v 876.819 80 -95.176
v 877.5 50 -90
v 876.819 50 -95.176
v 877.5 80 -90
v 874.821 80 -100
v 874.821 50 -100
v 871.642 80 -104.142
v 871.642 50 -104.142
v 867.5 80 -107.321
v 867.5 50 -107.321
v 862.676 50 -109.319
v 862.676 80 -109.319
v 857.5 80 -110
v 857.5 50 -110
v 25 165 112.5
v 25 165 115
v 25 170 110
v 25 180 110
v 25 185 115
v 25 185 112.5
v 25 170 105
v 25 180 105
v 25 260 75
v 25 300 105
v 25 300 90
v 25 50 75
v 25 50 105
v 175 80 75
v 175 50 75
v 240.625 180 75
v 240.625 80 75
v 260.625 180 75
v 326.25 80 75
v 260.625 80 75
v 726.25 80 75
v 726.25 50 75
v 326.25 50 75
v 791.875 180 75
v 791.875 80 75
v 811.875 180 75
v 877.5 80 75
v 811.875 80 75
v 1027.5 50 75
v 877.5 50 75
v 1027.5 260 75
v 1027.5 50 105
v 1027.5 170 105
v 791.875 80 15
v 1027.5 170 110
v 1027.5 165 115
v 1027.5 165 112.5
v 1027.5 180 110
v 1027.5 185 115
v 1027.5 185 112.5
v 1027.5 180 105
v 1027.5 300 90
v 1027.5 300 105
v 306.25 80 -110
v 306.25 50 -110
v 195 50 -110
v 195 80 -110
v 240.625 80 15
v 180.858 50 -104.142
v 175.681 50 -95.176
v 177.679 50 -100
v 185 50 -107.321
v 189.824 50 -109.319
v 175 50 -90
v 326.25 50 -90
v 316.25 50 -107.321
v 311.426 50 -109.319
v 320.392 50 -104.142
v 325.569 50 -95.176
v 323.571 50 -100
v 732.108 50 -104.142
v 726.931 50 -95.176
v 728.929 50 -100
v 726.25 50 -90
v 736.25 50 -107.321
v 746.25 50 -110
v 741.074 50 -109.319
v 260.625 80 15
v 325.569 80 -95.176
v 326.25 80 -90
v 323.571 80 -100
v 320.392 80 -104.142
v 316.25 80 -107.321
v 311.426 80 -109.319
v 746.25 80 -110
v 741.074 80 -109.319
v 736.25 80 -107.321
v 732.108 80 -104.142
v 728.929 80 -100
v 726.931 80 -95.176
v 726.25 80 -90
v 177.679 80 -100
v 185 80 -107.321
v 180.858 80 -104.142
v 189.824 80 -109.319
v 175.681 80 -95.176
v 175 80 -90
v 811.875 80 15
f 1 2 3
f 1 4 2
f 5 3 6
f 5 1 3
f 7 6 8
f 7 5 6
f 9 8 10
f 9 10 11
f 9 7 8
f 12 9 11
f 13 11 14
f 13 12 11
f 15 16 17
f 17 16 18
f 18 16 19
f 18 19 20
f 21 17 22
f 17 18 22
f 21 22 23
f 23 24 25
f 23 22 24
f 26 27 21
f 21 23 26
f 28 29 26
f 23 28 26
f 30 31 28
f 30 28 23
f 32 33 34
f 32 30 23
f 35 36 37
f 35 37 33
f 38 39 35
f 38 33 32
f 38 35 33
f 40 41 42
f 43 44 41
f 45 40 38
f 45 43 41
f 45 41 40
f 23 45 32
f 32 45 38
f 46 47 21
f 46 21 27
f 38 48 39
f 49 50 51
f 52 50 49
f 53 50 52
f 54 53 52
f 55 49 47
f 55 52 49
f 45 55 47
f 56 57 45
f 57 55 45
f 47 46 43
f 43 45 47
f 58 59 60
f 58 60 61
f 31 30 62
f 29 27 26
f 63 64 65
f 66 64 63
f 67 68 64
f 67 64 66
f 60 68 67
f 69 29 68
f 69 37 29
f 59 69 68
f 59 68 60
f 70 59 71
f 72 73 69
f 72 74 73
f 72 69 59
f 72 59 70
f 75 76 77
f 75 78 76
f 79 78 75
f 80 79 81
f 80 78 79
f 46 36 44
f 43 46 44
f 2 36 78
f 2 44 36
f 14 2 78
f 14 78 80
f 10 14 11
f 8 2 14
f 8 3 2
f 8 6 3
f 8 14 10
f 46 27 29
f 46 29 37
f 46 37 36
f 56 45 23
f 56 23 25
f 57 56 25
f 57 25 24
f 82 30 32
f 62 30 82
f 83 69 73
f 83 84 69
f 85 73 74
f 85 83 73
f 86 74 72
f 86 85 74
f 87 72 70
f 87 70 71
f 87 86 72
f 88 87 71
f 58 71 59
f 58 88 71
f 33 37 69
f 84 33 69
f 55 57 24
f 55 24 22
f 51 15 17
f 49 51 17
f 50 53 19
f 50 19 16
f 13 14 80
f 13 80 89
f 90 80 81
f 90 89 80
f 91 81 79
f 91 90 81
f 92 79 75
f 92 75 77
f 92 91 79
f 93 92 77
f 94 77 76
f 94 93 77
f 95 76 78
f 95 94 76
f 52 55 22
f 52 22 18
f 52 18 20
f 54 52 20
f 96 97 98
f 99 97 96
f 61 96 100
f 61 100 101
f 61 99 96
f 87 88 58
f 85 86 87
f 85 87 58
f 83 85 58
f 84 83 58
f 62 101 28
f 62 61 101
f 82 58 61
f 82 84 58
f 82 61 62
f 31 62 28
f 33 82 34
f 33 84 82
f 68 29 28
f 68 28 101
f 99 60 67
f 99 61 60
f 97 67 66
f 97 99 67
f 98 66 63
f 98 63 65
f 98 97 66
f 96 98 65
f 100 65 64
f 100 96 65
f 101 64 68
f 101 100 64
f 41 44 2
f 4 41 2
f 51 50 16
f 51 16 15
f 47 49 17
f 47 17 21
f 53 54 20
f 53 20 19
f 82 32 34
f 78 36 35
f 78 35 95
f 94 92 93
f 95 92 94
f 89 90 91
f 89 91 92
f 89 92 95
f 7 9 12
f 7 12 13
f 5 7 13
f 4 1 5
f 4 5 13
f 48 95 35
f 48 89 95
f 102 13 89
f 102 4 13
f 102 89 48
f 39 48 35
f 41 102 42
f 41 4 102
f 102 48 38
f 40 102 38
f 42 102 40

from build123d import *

# Parameters (mm, degrees)
EXTRUDE_1_DEPTH          = 1002.5
CUT_EXTRUDE_1_DEPTH      = 1058.062557278
CUT_EXTRUDE_1_DEPTH_BACK = 1058.062557278
SKETCH_2_W               = 400
SKETCH_2_H               = 185
CUT_EXTRUDE_2_DEPTH      = 1058.062557278
CUT_EXTRUDE_2_DEPTH_BACK = 1058.062557278
SKETCH_3_W               = 150
SKETCH_3_H               = 185
RIB_1_REACH              = 842.69
SKETCH_4_WALL_W          = 1799.999144386
SKETCH_4_WALL_H          = 20
RIB_2_REACH              = 842.69
SKETCH_5_WALL_W          = 1799.999144386
SKETCH_5_WALL_H          = 20
FILLET_2_R               = 20


with BuildPart() as part:
    # 草图1 → 凸台-拉伸1 (new body)
    with BuildSketch(Plane(origin=(1027.5, 0, 0), x_dir=(0, 0, -1), z_dir=(1, 0, 0))):
        Polygon((-105, 300), (-105, 180), (-110, 180), (-112.5, 185), (-115, 185), (-115, 165), (-112.5, 165), (-110, 170), (-105, 170), (-105, 50), (-75, 50), (110, 50), (110, 80), (-75, 80), (-75, 260), (-90, 300), align=None)
    extrude(amount=-EXTRUDE_1_DEPTH)

    # 草图2 → 切除-拉伸1 (cut, two sides: drawn at the far end of the back side and taken through both)
    with BuildSketch(Plane(origin=(0, 80, 0), x_dir=(1, 0, 0), z_dir=(0, 1, 0)).offset(-CUT_EXTRUDE_1_DEPTH_BACK)):
        with Locations((526.25, 17.5)):
            Rectangle(SKETCH_2_W, SKETCH_2_H)
    extrude(amount=CUT_EXTRUDE_1_DEPTH + CUT_EXTRUDE_1_DEPTH_BACK, mode=Mode.SUBTRACT)

    # 草图3 → 切除-拉伸2 (cut, two sides: drawn at the far end of the back side and taken through both)
    with BuildSketch(Plane(origin=(0, 80, 0), x_dir=(1, 0, 0), z_dir=(0, 1, 0)).offset(-CUT_EXTRUDE_2_DEPTH_BACK)):
        with Locations((100, 17.5)):
            Rectangle(SKETCH_3_W, SKETCH_3_H)
        with Locations((952.5, 17.5)):
            Rectangle(SKETCH_3_W, SKETCH_3_H)
    extrude(amount=CUT_EXTRUDE_2_DEPTH + CUT_EXTRUDE_2_DEPTH_BACK, mode=Mode.SUBTRACT)

    # 草图4 wall → 筋1 (add, up to next)
    with BuildSketch(Plane(origin=(801.875, 130, 45), x_dir=(0, 0.857492925713, 0.514495755428), z_dir=(0, -0.514495755428, 0.857492925713)), mode=Mode.PRIVATE) as rib_1_sk1:
        Rectangle(SKETCH_4_WALL_W, SKETCH_4_WALL_H)
    rib_1_tool1 = extrude(rib_1_sk1.sketch, amount=RIB_1_REACH, mode=Mode.PRIVATE) - part.part
    add(rib_1_tool1.solids().sort_by_distance((801.875, 130, 45))[0])

    # 草图5 wall → 筋2 (add, up to next)
    with BuildSketch(Plane(origin=(250.625, 130, 45), x_dir=(0, -0.857492925713, -0.514495755428), z_dir=(0, 0.514495755428, -0.857492925713)), mode=Mode.PRIVATE) as rib_2_sk1:
        Rectangle(SKETCH_5_WALL_W, SKETCH_5_WALL_H)
    rib_2_tool1 = extrude(rib_2_sk1.sketch, amount=-RIB_2_REACH, mode=Mode.PRIVATE) - part.part
    add(rib_2_tool1.solids().sort_by_distance((250.625, 130, 45))[0])

    # 圆角2
    fillet_2_edges = [part.edges().sort_by_distance(p)[0] for p in [
        (326.25, 65, -110),
        (726.25, 65, -110),
        (175, 65, -110),
        (877.5, 65, -110),
    ]]
    fillet(fillet_2_edges, radius=FILLET_2_R)


solid = part.part
